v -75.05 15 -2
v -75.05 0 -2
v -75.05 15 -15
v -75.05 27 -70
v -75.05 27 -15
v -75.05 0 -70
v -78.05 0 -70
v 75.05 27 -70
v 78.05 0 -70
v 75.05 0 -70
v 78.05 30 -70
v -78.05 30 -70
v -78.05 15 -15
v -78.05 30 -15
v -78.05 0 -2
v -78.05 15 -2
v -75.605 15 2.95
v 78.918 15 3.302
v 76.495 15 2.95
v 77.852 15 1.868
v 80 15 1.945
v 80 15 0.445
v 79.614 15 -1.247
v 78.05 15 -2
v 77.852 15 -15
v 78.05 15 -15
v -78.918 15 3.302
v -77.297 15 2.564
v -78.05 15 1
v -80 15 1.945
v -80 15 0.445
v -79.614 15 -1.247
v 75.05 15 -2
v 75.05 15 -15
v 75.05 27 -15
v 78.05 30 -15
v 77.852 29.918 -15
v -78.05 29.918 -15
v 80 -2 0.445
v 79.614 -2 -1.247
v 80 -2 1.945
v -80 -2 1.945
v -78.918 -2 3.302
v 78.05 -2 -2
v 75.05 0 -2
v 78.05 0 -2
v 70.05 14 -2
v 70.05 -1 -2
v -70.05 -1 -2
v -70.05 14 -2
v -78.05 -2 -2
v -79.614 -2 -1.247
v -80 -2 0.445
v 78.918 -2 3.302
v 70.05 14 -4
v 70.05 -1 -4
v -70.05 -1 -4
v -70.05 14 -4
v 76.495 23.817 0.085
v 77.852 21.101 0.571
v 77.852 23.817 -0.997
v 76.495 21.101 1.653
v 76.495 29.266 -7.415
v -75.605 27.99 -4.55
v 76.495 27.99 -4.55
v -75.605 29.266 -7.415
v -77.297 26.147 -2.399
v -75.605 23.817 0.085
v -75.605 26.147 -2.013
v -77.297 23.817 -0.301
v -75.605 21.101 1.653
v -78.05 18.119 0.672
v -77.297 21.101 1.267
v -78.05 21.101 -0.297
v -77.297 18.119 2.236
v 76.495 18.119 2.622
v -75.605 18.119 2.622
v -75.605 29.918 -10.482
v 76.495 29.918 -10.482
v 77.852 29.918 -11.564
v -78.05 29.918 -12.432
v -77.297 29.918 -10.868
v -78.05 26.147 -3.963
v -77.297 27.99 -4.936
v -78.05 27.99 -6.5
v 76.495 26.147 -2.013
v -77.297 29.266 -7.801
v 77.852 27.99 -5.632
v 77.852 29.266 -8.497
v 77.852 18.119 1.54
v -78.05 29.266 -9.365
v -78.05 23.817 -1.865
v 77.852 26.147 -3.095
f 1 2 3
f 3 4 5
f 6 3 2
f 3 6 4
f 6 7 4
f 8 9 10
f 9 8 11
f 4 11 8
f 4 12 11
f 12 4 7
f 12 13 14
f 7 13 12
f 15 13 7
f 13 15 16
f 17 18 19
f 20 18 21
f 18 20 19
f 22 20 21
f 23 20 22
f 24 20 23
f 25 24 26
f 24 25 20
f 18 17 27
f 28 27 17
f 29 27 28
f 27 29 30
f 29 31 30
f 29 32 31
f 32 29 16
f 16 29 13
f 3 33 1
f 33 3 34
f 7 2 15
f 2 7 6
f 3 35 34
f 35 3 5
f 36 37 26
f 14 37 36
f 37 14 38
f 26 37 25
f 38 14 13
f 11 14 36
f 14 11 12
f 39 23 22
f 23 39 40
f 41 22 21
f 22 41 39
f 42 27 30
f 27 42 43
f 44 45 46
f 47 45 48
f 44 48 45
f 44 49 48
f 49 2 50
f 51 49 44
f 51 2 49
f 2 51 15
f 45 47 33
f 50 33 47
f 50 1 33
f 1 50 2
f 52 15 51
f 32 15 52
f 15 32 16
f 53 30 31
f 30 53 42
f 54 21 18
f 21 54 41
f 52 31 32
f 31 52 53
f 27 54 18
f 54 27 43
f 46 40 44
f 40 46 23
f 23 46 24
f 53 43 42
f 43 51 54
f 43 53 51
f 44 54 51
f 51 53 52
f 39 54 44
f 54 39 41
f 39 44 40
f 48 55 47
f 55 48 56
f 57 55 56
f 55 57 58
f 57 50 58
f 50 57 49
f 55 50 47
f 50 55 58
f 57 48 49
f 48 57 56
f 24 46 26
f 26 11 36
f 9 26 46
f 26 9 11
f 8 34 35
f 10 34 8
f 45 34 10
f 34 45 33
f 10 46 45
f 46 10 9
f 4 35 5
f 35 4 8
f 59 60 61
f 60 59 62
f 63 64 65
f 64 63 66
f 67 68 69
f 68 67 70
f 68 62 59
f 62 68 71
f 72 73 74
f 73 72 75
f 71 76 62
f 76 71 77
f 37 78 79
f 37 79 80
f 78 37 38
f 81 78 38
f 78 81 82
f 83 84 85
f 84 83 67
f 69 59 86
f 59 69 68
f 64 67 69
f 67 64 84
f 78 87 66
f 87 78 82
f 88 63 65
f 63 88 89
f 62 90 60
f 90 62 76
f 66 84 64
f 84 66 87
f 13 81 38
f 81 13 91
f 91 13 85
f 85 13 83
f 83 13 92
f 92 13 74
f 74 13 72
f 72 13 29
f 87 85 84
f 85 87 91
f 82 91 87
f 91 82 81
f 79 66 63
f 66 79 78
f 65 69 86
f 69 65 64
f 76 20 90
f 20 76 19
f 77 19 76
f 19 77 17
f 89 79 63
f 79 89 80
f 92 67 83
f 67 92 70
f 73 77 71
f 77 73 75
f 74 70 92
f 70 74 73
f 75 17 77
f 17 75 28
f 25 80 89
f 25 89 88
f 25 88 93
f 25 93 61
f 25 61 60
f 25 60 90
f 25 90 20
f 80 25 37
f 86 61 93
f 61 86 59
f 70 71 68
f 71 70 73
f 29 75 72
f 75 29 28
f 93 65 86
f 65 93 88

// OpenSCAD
// we want something that can sit across the
// 5.25" bay holders, which are 146.1mm wide
w = 146.1;

// 15mm from xtop brace to back
m = 15;

// come just about down to the bottom
h = 70;

// brace we're topping is 1.5mm wide. give it
// an extra half mm.
i = 2;

// the wings on the sides hold us onto the
// braces. if they're too thin, they'll break off.
ww = 3;

translate([-w/2, 0, 0]){
    // left wing
    translate([-(i + ww), 0, -h]){
      cube([ww, m, h]);
    }
    translate([-(i + ww), 15, -h]){
      cube([ww, m, h - 15]);
    }
    
    // common layer
    translate([-(i + ww), 0, 0]){
        minkowski(){
            cube([w + i * 2 + ww * 2, m, 1.5]);
            rotate([90, 90, 0]){
                cylinder(r = 2, h = 2);
            }
        }
    }
    // middle piece to wedge us atop bay mounts
    translate([i + 1, -1, -4]){
        cube([w - i * 2 - 2, m, 4]);
    }
    // right wing
    translate([w + i, 0, -h]){
      cube([ww, m, h]);
    }
    translate([w + i, 15, -h]){
      cube([ww, m, h - 15]);
    }

    // backplate
    translate([-i, m + 12, -h]){
      cube([w + i * 2, ww, h - 15]);
    }

}

difference(){
  translate([0, m, -m + 1]){
    rotate([0, 90, 0]){
      minkowski(){
        cylinder(w + i * 3, m, m, true);
        rotate([90, 90, 0]){
          cylinder(2, 2, 2);
        }
      }
    }
  }
  union(){
    translate([0, 0, -45]){
      cube([w + i * 15, m * 4, m * 4], true);
    }
    translate([0, -m, -m]){
      cube([w + i * 15, m * 4, m * 4], true);
    }
  }
}
